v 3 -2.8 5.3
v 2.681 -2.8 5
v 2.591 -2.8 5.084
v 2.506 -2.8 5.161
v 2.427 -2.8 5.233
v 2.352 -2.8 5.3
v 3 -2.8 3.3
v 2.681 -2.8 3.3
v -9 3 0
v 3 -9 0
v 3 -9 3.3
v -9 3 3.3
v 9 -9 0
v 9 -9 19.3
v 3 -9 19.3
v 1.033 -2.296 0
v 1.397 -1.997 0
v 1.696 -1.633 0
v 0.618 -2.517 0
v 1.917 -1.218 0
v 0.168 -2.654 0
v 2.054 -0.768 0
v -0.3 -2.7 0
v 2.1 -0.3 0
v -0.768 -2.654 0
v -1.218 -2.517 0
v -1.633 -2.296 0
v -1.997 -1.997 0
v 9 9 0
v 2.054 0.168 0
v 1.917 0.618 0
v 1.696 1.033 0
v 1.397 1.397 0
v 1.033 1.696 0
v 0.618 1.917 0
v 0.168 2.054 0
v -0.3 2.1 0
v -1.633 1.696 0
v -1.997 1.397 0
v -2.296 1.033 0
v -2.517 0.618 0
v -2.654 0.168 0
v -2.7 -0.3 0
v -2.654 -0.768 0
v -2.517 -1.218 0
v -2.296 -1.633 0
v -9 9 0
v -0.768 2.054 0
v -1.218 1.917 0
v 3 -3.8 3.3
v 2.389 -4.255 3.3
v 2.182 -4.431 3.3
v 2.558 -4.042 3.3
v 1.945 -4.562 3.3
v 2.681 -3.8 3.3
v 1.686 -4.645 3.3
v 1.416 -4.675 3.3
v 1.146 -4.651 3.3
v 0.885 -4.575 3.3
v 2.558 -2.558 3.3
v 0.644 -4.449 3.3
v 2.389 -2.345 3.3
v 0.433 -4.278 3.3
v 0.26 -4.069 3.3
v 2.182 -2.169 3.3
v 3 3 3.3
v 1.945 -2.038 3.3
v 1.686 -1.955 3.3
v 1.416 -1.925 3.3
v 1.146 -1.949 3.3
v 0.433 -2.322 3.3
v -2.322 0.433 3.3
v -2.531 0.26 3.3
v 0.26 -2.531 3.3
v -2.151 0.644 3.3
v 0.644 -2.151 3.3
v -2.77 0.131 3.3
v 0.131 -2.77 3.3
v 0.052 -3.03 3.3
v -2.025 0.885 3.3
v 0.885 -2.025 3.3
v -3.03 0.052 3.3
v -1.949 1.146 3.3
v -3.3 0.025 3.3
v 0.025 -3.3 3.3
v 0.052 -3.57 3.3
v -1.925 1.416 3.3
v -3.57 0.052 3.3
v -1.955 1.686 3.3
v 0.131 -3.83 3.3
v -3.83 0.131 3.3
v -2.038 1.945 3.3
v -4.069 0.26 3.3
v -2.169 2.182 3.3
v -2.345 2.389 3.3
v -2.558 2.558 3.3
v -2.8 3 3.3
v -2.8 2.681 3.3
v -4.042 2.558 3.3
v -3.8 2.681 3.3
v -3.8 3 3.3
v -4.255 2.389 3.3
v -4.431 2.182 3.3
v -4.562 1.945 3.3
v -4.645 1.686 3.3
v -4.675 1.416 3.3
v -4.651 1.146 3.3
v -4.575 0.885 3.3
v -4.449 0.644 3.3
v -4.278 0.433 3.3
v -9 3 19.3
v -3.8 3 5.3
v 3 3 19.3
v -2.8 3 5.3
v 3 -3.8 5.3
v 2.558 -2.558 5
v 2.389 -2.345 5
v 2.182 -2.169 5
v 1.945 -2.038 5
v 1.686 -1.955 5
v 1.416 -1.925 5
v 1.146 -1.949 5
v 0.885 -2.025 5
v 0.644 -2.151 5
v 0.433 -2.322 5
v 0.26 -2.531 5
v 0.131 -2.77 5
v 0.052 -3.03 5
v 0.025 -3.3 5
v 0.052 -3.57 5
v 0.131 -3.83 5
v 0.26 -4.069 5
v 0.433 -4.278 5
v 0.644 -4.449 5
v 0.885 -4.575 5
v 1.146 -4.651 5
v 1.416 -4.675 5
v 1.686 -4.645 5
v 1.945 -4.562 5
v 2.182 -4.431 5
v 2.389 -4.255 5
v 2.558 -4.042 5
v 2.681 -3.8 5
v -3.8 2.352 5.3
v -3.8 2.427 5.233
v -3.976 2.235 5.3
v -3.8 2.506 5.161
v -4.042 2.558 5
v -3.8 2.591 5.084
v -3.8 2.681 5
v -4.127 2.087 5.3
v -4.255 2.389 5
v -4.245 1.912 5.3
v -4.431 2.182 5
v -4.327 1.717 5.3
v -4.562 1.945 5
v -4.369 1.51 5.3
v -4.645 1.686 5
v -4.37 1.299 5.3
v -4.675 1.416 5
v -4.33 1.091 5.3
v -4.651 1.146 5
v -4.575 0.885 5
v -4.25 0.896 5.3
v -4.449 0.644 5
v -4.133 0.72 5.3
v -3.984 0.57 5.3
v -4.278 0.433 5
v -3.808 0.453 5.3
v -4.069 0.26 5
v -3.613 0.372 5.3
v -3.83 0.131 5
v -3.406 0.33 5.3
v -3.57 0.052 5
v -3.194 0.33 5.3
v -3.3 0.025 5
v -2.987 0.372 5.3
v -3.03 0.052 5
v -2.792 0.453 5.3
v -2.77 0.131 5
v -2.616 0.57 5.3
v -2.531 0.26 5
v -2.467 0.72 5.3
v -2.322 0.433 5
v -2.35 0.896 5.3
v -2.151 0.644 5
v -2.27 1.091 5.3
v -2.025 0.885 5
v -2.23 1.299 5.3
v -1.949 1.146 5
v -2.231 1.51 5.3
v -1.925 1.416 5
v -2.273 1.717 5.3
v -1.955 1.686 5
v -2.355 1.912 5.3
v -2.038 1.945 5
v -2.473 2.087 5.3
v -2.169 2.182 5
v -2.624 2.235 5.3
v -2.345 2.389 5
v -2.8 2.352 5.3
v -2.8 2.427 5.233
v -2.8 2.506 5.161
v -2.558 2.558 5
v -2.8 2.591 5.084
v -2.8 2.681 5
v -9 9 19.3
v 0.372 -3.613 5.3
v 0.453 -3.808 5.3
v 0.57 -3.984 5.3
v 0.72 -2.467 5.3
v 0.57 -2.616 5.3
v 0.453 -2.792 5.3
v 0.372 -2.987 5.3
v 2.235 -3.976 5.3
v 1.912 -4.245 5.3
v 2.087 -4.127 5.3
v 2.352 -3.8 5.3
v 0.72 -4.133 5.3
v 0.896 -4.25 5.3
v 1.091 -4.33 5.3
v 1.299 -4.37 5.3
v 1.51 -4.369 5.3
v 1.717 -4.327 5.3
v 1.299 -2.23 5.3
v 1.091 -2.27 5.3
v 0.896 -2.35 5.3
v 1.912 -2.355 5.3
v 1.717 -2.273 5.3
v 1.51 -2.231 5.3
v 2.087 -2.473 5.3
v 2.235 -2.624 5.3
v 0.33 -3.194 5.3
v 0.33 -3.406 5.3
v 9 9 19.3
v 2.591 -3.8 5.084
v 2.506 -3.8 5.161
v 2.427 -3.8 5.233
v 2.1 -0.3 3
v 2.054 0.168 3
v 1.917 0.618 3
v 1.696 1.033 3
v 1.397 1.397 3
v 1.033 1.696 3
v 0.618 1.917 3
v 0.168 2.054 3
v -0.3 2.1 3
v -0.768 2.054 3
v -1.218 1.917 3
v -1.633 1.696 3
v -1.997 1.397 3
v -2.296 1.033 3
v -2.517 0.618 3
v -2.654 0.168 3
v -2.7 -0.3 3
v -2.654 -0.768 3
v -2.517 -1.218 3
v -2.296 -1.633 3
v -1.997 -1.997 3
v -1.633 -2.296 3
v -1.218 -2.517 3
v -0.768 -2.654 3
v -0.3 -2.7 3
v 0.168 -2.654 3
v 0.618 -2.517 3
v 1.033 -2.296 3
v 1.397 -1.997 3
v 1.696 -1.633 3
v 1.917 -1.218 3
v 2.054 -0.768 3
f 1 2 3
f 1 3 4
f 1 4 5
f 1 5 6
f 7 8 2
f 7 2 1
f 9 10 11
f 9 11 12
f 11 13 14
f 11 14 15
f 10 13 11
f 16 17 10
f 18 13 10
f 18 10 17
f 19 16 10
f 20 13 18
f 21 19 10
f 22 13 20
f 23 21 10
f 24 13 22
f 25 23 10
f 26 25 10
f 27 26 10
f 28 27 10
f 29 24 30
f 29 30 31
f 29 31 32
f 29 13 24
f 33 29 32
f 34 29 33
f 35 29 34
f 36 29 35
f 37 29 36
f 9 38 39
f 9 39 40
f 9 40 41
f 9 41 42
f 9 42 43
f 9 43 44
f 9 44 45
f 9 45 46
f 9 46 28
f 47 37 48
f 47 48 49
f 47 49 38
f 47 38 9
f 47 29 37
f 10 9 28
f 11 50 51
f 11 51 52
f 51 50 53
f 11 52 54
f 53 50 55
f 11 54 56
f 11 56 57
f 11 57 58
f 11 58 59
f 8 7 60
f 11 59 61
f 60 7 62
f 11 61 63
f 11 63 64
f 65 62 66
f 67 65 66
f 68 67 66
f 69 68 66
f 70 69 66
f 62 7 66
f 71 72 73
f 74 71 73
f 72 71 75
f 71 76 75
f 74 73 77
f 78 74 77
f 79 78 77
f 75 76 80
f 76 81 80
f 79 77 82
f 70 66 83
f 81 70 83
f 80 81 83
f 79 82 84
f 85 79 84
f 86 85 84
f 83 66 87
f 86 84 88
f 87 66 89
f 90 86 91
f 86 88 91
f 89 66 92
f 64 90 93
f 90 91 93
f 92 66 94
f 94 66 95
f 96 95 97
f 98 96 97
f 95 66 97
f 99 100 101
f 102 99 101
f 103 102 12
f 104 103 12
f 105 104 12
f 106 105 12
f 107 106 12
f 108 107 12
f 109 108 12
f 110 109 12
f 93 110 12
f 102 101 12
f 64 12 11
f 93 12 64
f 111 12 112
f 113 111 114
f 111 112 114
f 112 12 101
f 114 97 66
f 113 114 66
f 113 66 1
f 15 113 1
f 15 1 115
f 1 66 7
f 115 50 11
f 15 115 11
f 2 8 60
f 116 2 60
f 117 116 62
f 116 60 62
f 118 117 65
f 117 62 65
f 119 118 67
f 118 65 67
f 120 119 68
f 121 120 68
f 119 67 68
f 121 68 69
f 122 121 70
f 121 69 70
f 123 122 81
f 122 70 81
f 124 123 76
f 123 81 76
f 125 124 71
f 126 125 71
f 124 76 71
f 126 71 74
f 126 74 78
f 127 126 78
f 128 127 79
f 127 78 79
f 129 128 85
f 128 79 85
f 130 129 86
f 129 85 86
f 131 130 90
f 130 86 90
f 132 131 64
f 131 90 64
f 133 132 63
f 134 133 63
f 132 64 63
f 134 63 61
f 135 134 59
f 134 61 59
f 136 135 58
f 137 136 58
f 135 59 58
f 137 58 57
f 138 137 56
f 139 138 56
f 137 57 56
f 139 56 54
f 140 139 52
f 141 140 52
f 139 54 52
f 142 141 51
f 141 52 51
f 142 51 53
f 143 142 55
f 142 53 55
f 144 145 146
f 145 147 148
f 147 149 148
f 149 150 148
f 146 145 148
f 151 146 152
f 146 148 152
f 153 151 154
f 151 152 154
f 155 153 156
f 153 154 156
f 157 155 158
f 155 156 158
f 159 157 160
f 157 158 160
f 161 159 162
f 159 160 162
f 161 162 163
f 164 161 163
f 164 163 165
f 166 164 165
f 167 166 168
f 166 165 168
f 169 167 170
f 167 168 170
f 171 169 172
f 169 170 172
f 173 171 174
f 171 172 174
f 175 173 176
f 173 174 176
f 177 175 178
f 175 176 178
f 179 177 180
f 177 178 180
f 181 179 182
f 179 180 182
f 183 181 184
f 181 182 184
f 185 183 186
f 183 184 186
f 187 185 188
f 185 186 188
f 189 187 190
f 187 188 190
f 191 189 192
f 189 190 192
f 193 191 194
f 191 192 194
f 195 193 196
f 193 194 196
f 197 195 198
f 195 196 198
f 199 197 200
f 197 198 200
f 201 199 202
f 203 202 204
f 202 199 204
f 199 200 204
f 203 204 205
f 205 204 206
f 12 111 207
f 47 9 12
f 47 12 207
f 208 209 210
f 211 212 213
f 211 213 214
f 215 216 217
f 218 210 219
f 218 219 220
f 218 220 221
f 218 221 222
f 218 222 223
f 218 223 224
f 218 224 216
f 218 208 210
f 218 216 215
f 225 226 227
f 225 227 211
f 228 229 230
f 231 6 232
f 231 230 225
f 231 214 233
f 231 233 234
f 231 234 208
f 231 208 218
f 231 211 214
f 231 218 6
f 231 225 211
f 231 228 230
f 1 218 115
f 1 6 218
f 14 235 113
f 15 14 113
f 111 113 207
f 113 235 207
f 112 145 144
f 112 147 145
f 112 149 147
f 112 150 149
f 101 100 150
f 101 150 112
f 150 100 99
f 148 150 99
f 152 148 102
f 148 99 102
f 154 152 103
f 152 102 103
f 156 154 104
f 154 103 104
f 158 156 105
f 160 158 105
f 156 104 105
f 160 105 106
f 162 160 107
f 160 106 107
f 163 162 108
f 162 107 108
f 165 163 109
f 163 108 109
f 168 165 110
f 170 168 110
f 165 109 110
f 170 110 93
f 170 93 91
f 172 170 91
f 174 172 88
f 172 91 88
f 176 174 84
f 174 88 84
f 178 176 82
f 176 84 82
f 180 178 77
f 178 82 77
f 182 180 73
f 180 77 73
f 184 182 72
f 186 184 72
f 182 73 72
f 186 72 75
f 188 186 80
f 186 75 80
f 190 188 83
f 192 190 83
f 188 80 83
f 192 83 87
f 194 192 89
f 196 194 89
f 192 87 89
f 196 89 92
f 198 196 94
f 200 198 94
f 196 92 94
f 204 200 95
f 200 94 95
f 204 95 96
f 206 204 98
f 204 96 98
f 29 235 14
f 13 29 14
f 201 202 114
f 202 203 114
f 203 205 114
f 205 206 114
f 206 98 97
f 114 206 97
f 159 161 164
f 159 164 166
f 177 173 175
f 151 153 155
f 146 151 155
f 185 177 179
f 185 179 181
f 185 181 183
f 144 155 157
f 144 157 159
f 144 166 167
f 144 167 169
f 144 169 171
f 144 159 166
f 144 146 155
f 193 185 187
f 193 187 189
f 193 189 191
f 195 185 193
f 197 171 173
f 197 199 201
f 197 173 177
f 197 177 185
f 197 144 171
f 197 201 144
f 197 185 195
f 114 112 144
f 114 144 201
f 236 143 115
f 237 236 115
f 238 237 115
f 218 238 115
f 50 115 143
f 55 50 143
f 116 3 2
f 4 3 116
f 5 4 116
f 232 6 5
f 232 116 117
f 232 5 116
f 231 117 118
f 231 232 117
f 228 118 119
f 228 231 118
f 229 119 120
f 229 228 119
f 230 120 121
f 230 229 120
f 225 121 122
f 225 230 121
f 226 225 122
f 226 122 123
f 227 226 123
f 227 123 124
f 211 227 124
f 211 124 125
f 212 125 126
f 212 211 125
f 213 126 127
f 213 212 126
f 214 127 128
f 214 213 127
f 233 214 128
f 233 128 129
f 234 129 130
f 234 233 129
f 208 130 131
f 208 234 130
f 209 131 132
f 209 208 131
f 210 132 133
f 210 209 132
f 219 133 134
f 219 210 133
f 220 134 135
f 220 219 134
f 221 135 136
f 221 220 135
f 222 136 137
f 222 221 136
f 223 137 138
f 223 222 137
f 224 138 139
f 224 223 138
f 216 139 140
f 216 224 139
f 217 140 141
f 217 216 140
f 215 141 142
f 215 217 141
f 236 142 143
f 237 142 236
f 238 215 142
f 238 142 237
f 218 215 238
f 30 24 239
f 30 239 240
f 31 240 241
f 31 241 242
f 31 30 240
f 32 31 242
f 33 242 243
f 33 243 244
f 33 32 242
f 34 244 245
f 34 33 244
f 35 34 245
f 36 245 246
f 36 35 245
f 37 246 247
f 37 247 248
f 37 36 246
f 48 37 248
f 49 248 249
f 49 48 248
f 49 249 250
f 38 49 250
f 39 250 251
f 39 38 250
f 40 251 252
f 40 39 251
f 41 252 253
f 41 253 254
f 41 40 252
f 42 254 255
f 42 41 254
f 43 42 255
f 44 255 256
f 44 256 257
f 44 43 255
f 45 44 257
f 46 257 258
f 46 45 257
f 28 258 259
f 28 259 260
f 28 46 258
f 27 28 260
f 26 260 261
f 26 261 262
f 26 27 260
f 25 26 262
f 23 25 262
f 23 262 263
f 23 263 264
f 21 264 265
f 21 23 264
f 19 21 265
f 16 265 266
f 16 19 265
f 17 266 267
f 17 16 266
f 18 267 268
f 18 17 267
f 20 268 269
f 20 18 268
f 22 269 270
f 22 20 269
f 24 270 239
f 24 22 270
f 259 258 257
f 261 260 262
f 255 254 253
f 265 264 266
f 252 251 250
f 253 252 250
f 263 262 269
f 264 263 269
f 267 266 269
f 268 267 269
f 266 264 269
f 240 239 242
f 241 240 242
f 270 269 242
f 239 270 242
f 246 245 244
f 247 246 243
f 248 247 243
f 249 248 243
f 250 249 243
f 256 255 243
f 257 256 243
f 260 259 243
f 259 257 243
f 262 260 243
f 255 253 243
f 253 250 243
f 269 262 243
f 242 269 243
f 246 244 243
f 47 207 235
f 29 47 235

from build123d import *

# Parameters (mm, degrees)
PAD_DEPTH       = 19.3
POCKET_DEPTH    = 16.001
PAD001_DEPTH    = 2
SKETCH003_R     = 2.4
POCKET001_DEPTH = 3
CHAMFER_SIZE    = 0.3


with BuildPart() as part:
    # Sketch → Pad (new body)
    with BuildSketch(Plane.XY):
        Polygon((-9, 3), (-9, 9), (9, 9), (9, -9), (3, -9), align=None)
    extrude(amount=PAD_DEPTH)

    # Sketch001 (on DatumPlane) → Pocket (cut, through all)
    with BuildSketch(Plane.XY.offset(3.3)):
        Polygon((-9, 3), (3, 3), (3, -9), align=None)
    extrude(amount=POCKET_DEPTH, mode=Mode.SUBTRACT)

    # Sketch002 (on DatumPlane) → Pad001 (join)
    with BuildSketch(Plane.XY.offset(3.3)):
        with BuildLine():
            ThreePointArc((-3.8, 2.680869), (-3.3, 0.025), (-2.8, 2.680869))
            Line((-2.8, 2.680869), (-2.8, 3))
            Line((-3.8, 3), (-2.8, 3))
            Line((-3.8, 2.680869), (-3.8, 3))
        make_face()
        with BuildLine():
            ThreePointArc((2.680869, -2.8), (0.025, -3.3), (2.680869, -3.8))
            Line((3, -3.8), (2.680869, -3.8))
            Line((3, -2.8), (3, -3.8))
            Line((2.680869, -2.8), (3, -2.8))
        make_face()
    extrude(amount=PAD001_DEPTH)

    # Sketch003 → Pocket001 (cut)
    with BuildSketch(Plane.XY):
        with Locations((-0.3, -0.3)):
            Circle(SKETCH003_R)
    extrude(amount=POCKET001_DEPTH, mode=Mode.SUBTRACT)

    # Chamfer
    chamfer_edges = [part.edges().sort_by_distance(p)[0] for p in [
        (-3.3, 0.025, 5.3),
        (0.025, -3.3, 5.3),
    ]]
    chamfer(chamfer_edges, length=CHAMFER_SIZE)


solid = part.part
